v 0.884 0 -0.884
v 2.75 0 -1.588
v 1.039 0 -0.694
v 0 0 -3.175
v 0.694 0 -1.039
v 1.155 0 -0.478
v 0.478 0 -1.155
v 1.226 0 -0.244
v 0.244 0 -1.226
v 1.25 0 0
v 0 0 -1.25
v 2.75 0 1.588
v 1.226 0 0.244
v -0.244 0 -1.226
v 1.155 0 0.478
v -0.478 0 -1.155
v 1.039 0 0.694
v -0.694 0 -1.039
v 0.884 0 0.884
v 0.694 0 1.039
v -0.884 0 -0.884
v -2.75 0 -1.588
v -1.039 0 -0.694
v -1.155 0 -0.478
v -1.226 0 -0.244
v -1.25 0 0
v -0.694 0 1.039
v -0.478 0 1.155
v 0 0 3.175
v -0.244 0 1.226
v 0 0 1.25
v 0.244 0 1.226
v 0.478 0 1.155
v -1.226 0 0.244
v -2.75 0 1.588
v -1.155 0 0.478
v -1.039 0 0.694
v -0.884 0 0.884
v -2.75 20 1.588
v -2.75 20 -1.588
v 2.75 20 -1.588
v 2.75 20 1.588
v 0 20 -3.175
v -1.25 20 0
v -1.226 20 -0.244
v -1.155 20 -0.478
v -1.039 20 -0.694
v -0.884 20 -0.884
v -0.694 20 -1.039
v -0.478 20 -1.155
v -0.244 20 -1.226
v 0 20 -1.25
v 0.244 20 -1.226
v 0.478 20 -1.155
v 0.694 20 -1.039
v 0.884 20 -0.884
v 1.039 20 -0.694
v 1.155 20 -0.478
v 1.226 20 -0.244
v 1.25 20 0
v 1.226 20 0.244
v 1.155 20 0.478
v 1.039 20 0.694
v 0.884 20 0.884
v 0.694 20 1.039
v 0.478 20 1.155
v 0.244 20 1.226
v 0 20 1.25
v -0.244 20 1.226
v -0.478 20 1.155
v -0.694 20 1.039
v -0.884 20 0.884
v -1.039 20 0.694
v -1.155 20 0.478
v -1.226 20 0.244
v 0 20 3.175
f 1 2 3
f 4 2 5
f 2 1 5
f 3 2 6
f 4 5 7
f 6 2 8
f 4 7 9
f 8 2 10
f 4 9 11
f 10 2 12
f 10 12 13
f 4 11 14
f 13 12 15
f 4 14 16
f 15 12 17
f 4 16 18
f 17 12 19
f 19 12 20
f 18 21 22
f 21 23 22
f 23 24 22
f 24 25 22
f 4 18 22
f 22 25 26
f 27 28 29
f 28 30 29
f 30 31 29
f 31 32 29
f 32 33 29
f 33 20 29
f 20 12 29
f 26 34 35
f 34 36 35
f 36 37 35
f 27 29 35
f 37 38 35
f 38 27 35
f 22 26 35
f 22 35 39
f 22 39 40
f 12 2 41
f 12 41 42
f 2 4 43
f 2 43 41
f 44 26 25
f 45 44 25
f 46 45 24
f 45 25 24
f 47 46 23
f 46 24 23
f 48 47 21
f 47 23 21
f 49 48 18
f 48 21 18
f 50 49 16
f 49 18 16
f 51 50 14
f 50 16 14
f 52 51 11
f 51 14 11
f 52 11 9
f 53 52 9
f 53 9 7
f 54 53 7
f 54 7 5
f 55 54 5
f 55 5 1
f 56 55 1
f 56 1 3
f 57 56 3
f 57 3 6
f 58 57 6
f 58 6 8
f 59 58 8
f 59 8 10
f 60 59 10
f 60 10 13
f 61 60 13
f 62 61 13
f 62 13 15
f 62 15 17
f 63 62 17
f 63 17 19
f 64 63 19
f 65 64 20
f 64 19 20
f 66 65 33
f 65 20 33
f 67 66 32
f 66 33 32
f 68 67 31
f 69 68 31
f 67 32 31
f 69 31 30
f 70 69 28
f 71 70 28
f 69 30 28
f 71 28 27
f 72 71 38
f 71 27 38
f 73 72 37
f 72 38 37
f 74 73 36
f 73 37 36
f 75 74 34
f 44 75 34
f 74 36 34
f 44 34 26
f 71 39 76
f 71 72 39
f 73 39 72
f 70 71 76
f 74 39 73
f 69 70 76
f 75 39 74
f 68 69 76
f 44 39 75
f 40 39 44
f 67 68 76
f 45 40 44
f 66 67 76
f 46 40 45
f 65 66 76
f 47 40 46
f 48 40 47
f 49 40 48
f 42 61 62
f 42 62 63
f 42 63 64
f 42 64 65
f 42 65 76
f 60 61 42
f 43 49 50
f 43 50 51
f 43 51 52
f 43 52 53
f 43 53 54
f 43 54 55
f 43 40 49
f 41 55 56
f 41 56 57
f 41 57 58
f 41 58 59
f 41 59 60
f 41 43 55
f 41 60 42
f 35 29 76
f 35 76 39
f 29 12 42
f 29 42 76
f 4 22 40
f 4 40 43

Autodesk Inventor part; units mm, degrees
ref_plane "YZ Plane" through (0, 0, 0) normal (1, 0, 0) x (0, 1, 0)
ref_plane "XZ Plane" through (0, 0, 0) normal (0, 1, 0) x (-1, 0, 0)
ref_plane "XY Plane" through (0, 0, 0) normal (0, 0, 1) x (1, 0, 0)
sketch "Sketch1" plane through (0, 0, 0) normal (0, 1, 0) x (-1, 0, 0)
  circle A0 centre (0, 0) radius 2.75
  line L0 (2.75, -1.5877) -> (0, -3.1754)
  line L1 (0, -3.1754) -> (-2.75, -1.5877)
  line L2 (-2.75, -1.5877) -> (-2.75, 1.5877)
  line L3 (-2.75, 1.5877) -> (0, 3.1754)
  line L4 (0, 3.1754) -> (2.75, 1.5877)
  line L5 (2.75, 1.5877) -> (2.75, -1.5877)
  circle A1 centre (0, 0) radius 1.25
  point P0 (2.75, 0)
  dimension "d0" = 5.5
  dimension "d1" = 2.5
extrude "Extrusion1" add sketch "Sketch1" along normal blind 30
thread "Thread1" size "M3x0.5" class "6H" standard "ANSI Metric M Profile" full length
sketch "Sketch2" plane through (0, 30, 0) normal (0, 1, 0) x (1, 0, 0)
  line L0 (-7.5964, -8.221) -> (7.9188, -8.221)
  line L1 (7.9188, -8.221) -> (7.9188, 5.8837)
  line L2 (7.9188, 5.8837) -> (-7.5964, 5.8837)
  line L3 (-7.5964, 5.8837) -> (-7.5964, -8.221)
  point P0 (0, 0)
extrude "Extrusion2" cut sketch "Sketch2" against normal blind 10
properties part number "Distance_M3_20" material "Nickel-Copper Alloy 400"
